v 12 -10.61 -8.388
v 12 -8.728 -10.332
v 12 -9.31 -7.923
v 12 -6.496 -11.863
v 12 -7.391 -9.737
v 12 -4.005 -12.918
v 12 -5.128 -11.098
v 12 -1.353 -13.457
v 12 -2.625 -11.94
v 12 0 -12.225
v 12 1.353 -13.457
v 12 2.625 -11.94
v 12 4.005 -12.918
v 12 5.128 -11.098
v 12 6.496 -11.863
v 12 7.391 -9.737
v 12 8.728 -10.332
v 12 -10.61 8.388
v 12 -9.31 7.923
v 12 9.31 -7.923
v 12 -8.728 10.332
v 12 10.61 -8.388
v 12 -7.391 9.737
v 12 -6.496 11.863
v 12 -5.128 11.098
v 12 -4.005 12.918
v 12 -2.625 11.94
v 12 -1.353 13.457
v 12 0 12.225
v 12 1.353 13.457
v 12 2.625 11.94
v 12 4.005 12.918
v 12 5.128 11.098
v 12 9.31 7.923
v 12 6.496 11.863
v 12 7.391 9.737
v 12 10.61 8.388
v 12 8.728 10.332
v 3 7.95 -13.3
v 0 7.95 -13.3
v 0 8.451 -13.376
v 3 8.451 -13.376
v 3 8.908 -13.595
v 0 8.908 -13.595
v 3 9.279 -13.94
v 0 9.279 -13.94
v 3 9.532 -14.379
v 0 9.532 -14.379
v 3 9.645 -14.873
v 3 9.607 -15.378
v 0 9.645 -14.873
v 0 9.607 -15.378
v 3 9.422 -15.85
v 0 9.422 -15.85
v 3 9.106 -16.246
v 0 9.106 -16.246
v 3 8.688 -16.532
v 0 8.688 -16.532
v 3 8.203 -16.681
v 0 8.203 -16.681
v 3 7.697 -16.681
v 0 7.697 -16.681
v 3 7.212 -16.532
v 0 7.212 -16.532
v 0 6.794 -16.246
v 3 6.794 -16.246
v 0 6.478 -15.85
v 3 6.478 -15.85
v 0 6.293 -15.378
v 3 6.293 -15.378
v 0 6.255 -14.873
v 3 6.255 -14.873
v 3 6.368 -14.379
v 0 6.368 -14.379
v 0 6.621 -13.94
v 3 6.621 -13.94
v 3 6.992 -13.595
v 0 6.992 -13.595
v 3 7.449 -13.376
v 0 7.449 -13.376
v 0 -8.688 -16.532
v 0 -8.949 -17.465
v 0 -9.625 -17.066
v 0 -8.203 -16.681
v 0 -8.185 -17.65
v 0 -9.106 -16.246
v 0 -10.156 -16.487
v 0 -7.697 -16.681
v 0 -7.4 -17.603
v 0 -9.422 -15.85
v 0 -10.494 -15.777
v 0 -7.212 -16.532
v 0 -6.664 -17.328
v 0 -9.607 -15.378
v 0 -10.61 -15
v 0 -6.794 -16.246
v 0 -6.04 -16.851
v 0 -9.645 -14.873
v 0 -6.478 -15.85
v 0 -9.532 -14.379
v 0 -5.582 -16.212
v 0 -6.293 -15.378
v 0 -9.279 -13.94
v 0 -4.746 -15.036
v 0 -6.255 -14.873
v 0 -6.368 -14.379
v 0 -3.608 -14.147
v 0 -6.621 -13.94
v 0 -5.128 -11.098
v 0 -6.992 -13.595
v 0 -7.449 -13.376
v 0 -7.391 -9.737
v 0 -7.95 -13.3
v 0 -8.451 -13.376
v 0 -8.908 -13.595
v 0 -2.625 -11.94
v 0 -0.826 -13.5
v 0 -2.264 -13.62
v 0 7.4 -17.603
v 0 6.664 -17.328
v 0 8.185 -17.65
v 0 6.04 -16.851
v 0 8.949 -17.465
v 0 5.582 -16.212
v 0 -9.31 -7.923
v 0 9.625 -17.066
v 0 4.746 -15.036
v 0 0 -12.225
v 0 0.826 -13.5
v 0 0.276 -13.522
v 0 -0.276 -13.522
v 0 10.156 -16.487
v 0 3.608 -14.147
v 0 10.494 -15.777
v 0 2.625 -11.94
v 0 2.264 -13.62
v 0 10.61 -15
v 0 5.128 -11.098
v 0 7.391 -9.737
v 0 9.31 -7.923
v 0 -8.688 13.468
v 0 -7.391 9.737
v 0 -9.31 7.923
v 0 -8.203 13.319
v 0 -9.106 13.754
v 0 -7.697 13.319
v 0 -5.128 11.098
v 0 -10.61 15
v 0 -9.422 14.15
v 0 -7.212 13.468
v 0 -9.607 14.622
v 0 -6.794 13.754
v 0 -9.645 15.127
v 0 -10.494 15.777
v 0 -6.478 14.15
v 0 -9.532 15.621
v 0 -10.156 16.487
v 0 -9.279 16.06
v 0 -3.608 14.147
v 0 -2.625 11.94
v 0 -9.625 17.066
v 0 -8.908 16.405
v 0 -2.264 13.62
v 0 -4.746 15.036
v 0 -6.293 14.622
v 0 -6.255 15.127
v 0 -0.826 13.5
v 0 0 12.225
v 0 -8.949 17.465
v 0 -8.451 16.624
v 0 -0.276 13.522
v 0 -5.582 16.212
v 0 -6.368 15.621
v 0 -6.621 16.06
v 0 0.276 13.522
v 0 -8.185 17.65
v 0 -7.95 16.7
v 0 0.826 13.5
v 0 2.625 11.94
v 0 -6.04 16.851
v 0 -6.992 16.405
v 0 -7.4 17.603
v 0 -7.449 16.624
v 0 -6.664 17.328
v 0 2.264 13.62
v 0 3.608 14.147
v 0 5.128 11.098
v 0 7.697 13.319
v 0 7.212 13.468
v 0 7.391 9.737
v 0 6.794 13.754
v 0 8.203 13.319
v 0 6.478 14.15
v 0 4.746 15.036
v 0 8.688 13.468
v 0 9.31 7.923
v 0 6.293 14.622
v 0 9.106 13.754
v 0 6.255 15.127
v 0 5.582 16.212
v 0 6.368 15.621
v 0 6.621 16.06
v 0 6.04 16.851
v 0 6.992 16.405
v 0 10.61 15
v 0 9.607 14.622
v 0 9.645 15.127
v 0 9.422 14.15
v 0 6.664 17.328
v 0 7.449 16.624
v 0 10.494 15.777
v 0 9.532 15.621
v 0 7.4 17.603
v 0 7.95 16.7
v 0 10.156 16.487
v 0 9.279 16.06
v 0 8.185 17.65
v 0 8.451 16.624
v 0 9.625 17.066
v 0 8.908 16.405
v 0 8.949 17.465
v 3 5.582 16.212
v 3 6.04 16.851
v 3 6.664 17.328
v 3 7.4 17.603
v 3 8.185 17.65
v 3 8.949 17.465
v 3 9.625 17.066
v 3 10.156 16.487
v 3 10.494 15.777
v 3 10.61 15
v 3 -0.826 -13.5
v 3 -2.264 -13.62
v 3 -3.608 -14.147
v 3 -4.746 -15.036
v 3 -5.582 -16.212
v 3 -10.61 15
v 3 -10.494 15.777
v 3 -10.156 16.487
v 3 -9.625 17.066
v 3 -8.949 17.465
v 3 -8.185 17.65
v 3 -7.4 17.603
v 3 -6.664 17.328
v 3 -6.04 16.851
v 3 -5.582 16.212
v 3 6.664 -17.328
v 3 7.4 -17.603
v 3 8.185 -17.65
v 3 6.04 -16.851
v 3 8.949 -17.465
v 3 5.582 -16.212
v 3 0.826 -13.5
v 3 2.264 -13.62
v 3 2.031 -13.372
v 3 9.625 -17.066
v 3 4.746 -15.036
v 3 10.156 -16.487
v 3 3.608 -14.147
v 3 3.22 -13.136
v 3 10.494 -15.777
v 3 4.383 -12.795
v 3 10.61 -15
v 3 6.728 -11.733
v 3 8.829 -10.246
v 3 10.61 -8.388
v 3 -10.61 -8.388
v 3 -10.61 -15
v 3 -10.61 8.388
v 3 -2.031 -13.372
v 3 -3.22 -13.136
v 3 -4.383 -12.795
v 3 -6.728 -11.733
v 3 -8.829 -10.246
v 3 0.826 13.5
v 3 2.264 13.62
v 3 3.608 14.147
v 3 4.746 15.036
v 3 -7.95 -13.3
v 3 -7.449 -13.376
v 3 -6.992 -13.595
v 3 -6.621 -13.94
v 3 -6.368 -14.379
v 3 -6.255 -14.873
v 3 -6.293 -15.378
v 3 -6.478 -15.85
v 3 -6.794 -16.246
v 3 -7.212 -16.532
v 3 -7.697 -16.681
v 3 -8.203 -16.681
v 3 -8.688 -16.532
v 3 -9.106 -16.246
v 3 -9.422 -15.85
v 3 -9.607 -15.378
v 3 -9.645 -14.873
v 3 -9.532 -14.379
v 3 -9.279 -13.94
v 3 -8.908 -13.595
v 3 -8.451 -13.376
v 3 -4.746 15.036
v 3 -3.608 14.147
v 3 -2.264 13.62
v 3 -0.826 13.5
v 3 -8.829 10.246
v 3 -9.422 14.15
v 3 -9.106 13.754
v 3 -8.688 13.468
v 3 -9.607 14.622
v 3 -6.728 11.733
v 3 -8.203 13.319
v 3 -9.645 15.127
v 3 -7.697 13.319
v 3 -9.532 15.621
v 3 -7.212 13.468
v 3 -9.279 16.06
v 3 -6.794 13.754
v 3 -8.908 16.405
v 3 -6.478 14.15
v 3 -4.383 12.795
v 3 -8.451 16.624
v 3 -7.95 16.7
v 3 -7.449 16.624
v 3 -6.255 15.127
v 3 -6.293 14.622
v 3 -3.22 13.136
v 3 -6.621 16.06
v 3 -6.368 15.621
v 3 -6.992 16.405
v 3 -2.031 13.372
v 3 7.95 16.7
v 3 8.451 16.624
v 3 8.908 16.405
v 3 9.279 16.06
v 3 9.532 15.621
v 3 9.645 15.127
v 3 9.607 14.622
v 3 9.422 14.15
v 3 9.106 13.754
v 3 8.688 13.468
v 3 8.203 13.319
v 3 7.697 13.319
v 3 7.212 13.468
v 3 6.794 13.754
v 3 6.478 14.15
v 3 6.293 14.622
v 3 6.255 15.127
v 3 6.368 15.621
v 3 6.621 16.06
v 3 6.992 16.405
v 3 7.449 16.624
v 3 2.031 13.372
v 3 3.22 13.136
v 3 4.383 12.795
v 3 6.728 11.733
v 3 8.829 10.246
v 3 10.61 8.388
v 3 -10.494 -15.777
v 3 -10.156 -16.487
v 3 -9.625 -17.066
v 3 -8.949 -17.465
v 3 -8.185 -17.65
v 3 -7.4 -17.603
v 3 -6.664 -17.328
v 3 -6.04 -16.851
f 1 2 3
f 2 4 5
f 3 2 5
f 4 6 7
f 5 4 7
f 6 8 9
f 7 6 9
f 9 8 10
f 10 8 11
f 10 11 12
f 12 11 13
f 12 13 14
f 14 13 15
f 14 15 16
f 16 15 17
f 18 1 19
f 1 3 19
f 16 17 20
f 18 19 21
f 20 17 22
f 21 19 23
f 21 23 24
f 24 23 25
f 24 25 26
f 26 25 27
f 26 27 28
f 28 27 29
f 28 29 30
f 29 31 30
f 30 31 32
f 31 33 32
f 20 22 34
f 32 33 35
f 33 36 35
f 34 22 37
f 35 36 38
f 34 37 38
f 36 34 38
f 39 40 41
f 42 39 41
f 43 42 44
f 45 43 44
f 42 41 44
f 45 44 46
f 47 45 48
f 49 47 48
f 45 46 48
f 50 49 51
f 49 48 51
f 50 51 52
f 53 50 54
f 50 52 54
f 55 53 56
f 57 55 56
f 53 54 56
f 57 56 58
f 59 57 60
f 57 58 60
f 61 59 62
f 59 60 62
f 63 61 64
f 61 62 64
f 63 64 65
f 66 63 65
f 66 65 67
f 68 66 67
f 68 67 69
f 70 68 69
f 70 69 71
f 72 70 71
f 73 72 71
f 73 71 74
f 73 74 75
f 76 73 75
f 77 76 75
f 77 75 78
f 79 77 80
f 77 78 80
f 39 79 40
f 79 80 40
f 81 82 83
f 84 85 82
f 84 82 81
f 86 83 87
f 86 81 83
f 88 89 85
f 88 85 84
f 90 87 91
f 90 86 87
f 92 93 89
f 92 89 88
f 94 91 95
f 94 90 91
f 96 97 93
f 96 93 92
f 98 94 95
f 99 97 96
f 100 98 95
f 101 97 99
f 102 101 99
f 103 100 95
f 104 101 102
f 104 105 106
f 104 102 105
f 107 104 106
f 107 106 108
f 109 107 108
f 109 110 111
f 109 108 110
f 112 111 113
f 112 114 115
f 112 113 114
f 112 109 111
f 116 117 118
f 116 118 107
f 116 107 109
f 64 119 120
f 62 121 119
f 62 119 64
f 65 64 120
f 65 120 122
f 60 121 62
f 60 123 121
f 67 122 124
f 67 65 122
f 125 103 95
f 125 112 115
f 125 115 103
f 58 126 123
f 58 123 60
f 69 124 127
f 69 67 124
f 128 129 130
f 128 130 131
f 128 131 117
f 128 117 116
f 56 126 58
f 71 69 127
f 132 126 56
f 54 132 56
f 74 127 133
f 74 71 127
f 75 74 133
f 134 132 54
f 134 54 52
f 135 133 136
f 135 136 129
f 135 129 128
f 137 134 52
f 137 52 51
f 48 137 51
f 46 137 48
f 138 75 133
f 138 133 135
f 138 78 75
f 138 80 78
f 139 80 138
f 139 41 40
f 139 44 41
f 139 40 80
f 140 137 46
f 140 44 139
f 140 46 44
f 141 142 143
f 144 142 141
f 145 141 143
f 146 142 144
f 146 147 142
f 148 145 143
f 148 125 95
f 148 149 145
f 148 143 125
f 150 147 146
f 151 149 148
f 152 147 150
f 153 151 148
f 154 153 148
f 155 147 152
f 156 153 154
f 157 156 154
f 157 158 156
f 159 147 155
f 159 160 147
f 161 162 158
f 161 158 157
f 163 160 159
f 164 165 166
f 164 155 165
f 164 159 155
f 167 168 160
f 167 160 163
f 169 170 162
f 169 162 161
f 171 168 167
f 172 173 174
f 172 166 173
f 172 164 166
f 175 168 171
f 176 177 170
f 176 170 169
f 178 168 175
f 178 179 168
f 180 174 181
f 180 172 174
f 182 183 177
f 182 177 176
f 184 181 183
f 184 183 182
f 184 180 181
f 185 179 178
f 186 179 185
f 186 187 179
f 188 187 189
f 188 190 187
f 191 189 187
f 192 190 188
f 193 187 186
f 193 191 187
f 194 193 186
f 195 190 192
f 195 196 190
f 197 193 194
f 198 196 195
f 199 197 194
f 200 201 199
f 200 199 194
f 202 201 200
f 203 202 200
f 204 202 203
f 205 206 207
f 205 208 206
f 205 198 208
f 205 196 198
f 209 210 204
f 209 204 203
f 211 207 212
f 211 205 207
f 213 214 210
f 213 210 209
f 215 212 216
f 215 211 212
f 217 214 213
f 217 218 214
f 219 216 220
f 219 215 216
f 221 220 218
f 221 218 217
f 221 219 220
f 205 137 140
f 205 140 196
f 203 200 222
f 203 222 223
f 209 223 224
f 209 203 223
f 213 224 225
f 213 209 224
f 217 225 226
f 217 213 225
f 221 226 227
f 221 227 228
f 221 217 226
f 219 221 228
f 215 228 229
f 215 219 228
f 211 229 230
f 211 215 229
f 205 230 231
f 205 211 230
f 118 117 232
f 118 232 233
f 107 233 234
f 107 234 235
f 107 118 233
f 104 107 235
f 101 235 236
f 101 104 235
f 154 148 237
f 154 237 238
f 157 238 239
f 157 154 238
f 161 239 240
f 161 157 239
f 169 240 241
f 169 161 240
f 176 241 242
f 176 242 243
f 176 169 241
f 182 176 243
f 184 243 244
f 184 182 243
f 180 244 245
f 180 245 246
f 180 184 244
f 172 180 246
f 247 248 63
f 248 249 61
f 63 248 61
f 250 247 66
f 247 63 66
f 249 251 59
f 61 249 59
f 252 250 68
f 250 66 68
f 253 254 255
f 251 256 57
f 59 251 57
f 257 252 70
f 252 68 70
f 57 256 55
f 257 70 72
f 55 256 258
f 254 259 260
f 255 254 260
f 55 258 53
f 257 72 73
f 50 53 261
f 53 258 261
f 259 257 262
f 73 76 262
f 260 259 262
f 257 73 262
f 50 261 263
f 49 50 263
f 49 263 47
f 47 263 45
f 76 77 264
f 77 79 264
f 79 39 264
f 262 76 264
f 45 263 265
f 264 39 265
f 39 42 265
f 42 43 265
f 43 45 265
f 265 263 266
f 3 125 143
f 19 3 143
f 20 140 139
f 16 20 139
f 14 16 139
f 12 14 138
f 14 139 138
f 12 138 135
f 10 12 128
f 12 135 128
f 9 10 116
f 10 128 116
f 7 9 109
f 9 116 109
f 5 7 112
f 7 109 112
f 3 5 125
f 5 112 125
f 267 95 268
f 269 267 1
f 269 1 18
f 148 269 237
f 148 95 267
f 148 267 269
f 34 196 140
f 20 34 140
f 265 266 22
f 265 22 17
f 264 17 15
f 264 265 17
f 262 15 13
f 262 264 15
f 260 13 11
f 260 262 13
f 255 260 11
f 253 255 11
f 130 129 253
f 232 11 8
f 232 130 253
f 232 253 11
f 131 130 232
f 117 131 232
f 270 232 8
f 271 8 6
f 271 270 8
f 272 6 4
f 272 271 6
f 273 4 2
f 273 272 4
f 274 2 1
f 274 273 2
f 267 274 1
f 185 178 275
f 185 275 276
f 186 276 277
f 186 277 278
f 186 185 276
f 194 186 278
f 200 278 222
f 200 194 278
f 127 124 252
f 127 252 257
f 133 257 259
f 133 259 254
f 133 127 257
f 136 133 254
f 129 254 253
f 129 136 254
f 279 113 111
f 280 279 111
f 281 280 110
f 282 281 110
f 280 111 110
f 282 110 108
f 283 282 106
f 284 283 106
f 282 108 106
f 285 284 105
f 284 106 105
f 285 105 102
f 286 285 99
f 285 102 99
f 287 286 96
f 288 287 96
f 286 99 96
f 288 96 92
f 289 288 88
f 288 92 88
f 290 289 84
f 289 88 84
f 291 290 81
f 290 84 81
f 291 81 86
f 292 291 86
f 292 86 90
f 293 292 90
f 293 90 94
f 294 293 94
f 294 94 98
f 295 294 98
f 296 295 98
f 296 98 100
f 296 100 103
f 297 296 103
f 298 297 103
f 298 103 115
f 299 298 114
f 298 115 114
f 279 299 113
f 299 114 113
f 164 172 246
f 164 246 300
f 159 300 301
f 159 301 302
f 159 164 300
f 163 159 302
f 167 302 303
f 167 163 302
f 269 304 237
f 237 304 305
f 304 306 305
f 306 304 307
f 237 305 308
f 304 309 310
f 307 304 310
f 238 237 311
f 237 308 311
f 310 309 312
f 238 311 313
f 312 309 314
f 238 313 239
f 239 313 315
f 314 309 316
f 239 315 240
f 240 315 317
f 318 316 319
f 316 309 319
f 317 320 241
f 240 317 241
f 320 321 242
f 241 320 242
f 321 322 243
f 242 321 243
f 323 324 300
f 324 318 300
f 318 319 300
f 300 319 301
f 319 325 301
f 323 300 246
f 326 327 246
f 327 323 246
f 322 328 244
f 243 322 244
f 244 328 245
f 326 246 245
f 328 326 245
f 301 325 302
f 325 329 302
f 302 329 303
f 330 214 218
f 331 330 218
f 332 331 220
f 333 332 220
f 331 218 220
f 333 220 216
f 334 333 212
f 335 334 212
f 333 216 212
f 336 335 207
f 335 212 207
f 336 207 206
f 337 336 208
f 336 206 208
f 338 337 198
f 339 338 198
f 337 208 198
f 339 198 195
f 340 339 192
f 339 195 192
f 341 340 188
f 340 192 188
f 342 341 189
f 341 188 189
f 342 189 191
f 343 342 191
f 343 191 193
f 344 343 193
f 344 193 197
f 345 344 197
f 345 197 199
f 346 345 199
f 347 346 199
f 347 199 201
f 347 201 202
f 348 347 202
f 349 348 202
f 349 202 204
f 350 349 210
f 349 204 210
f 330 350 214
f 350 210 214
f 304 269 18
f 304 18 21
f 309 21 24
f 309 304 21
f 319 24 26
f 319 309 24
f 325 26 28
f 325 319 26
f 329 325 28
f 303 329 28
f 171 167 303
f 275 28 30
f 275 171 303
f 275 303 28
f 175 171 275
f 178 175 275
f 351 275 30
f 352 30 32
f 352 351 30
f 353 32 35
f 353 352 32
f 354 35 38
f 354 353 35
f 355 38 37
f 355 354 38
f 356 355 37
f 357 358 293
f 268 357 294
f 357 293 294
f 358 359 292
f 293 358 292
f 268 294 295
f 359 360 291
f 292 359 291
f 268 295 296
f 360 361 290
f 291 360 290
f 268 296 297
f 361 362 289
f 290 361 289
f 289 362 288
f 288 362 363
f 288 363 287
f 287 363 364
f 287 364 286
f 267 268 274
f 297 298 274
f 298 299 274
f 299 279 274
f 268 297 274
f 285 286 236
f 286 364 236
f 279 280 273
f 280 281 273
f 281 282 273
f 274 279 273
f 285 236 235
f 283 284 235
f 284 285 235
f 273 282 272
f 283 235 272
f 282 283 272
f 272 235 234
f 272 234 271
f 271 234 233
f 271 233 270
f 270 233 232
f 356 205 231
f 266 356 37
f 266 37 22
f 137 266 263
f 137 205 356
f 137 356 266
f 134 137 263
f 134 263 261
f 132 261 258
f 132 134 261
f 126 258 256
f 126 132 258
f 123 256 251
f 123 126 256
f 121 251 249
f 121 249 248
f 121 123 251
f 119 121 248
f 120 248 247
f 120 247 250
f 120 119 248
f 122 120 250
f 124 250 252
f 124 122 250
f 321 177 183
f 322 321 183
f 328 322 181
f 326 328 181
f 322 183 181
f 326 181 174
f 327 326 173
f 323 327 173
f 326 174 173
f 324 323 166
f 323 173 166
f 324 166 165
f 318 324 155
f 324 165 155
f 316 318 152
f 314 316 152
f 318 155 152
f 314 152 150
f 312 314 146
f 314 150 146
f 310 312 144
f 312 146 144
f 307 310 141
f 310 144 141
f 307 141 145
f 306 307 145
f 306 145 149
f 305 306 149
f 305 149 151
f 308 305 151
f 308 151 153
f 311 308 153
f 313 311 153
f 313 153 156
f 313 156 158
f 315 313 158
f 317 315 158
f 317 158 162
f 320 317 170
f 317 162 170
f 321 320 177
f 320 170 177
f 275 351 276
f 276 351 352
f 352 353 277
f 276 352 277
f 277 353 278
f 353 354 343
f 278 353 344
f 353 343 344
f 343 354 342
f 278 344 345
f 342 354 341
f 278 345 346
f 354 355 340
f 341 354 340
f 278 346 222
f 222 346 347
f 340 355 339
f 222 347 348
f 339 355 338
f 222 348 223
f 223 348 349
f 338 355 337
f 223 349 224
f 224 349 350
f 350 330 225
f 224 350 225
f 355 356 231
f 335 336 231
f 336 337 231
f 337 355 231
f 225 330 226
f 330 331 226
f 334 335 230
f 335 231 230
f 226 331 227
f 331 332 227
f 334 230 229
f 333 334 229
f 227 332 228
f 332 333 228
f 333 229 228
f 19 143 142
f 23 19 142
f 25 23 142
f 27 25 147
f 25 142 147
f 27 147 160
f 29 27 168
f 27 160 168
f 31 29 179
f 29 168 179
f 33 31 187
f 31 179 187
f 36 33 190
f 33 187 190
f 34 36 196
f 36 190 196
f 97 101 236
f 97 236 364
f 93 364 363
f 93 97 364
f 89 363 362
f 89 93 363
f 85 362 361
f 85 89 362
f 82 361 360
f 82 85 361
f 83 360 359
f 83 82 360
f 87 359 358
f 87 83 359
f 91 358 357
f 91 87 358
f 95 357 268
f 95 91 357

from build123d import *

# Parameters (mm, degrees)
MOTOR_HOLDER_DEPTH  = 12
SKETCH2_R           = 1.7
BOSS_EXTRUDE1_DEPTH = 3
FILLET1_R           = 5


with BuildPart() as part:
    # Sketch1 → Motor Holder (new body)
    with BuildSketch(Plane(origin=(0, 0, 0), x_dir=(0, 0, -1), z_dir=(1, 0, 0))):
        with BuildLine():
            Line((-8.387700817, 10.61), (8.387700817, 10.61))
            ThreePointArc((8.387700817, 10.61), (13.525, 0), (8.387700817, -10.61))
            Line((8.387700817, -10.61), (-8.387700817, -10.61))
            ThreePointArc((-8.387700817, -10.61), (-13.525, 0), (-8.387700817, 10.61))
        make_face()
        with BuildLine():
            Line((-7.923037612, 9.31), (7.923037612, 9.31))
            ThreePointArc((7.923037612, 9.31), (12.225, 0), (7.923037612, -9.31))
            Line((7.923037612, -9.31), (-7.923037612, -9.31))
            ThreePointArc((-7.923037612, -9.31), (-12.225, 0), (-7.923037612, 9.31))
        make_face(mode=Mode.SUBTRACT)
    extrude(amount=MOTOR_HOLDER_DEPTH)

    # Sketch2 → Boss-Extrude1 (add)
    # profile 1 of 4: a face of its own
    with BuildSketch(Plane.ZY):
        with BuildLine():
            Line((-15.86201317, 5.433547478), (-12.795120435, 4.382980497))
            ThreePointArc((-12.795120435, 4.382980497), (-11.039561677, 7.8136869), (-8.387700817, 10.61))
            Line((-8.387700817, 10.61), (-15, 10.61))
            ThreePointArc((-15, 10.61), (-17.623867728, 8.386941811), (-15.86201317, 5.433547478))
        make_face()
        with Locations((-15, 7.95)):
            Circle(SKETCH2_R, mode=Mode.SUBTRACT)
    # profile 2 of 4: a face of its own
    with BuildSketch(Plane.ZY):
        with BuildLine():
            Line((-15, -10.61), (-8.387700817, -10.61))
            ThreePointArc((-8.387700817, -10.61), (-11.039561677, -7.8136869), (-12.795120435, -4.382980497))
            Line((-12.795120435, -4.382980497), (-15.86201317, -5.433547478))
            ThreePointArc((-15.86201317, -5.433547478), (-17.623867728, -8.386941811), (-15, -10.61))
        make_face()
        with Locations((-15, -7.95)):
            Circle(SKETCH2_R, mode=Mode.SUBTRACT)
    # profile 3 of 4: a face of its own
    with BuildSketch(Plane.ZY):
        with BuildLine():
            Line((15.86201317, -5.433547478), (12.795120435, -4.382980497))
            ThreePointArc((12.795120435, -4.382980497), (11.039561677, -7.8136869), (8.387700817, -10.61))
            Line((8.387700817, -10.61), (15, -10.61))
            ThreePointArc((15, -10.61), (17.623867728, -8.386941811), (15.86201317, -5.433547478))
        make_face()
        with Locations((15, -7.95)):
            Circle(SKETCH2_R, mode=Mode.SUBTRACT)
    # profile 4 of 4: a face of its own
    with BuildSketch(Plane.ZY):
        with BuildLine():
            Line((15, 10.61), (8.387700817, 10.61))
            ThreePointArc((8.387700817, 10.61), (11.039561677, 7.8136869), (12.795120435, 4.382980497))
            Line((12.795120435, 4.382980497), (15.86201317, 5.433547478))
            ThreePointArc((15.86201317, 5.433547478), (17.623867728, 8.386941811), (15, 10.61))
        make_face()
        with Locations((15, 7.95)):
            Circle(SKETCH2_R, mode=Mode.SUBTRACT)
    extrude(amount=-BOSS_EXTRUDE1_DEPTH)

    # Fillet1
    # the kernel refuses this fillet: 5 mm, written as the material it adds along each edge
    with BuildSketch(Plane(origin=(0, -4.382980497, -12.795120435), x_dir=(0, -0.3311587269792296, -0.9435750619561202), z_dir=(1, 0, 0)), Plane(origin=(0, 4.382980497, 12.795120435), x_dir=(0, 0.3311587269792292, 0.9435750619561204), z_dir=(1, 0, 0))) as fillet1_piece_1:
        with BuildLine():
            CenterArc((4.297165601, 4.954108155), FILLET1_R, 195.837486713, 66.393727894)
            Line((-0.513032618, 3.589559476), (-0.99405244, 3.453104608))
            ThreePointArc((-0.99405244, 3.453104608), (-0.630646565, 1.74130771), (-0.499985908, -0.003753963))
            Line((-0.499985908, -0.003753963), (0.003753963, -0.499985908))
            ThreePointArc((0.003753963, -0.499985908), (3.245501889, -0.475646418), (3.553698727, -0.495410815))
            Line((3.553698727, -0.495410815), (3.621286625, 0))
        make_face()
    extrude(amount=3)
    with BuildSketch(Plane(origin=(0, 4.382980497, -12.795120435), x_dir=(0, 0.3311587269792287, -0.9435750619561205), z_dir=(1, 0, 0)), Plane(origin=(0, -4.382980497, 12.795120435), x_dir=(0, -0.3311587269792296, 0.9435750619561202), z_dir=(1, 0, 0))) as fillet1_piece_2:
        with BuildLine():
            CenterArc((4.297165601, -4.954108155), FILLET1_R, 97.768785393, 66.393727894)
            Line((-0.513032618, -3.589559476), (-0.99405244, -3.453104608))
            ThreePointArc((-0.99405244, -3.453104608), (-0.630646565, -1.74130771), (-0.499985908, 0.003753963))
            Line((-0.499985908, 0.003753963), (0.003753963, 0.499985908))
            ThreePointArc((0.003753963, 0.499985908), (3.245501889, 0.475646418), (3.553698727, 0.495410815))
            Line((3.553698727, 0.495410815), (3.621286625, 0))
        make_face()
    extrude(amount=3)


solid = part.part
